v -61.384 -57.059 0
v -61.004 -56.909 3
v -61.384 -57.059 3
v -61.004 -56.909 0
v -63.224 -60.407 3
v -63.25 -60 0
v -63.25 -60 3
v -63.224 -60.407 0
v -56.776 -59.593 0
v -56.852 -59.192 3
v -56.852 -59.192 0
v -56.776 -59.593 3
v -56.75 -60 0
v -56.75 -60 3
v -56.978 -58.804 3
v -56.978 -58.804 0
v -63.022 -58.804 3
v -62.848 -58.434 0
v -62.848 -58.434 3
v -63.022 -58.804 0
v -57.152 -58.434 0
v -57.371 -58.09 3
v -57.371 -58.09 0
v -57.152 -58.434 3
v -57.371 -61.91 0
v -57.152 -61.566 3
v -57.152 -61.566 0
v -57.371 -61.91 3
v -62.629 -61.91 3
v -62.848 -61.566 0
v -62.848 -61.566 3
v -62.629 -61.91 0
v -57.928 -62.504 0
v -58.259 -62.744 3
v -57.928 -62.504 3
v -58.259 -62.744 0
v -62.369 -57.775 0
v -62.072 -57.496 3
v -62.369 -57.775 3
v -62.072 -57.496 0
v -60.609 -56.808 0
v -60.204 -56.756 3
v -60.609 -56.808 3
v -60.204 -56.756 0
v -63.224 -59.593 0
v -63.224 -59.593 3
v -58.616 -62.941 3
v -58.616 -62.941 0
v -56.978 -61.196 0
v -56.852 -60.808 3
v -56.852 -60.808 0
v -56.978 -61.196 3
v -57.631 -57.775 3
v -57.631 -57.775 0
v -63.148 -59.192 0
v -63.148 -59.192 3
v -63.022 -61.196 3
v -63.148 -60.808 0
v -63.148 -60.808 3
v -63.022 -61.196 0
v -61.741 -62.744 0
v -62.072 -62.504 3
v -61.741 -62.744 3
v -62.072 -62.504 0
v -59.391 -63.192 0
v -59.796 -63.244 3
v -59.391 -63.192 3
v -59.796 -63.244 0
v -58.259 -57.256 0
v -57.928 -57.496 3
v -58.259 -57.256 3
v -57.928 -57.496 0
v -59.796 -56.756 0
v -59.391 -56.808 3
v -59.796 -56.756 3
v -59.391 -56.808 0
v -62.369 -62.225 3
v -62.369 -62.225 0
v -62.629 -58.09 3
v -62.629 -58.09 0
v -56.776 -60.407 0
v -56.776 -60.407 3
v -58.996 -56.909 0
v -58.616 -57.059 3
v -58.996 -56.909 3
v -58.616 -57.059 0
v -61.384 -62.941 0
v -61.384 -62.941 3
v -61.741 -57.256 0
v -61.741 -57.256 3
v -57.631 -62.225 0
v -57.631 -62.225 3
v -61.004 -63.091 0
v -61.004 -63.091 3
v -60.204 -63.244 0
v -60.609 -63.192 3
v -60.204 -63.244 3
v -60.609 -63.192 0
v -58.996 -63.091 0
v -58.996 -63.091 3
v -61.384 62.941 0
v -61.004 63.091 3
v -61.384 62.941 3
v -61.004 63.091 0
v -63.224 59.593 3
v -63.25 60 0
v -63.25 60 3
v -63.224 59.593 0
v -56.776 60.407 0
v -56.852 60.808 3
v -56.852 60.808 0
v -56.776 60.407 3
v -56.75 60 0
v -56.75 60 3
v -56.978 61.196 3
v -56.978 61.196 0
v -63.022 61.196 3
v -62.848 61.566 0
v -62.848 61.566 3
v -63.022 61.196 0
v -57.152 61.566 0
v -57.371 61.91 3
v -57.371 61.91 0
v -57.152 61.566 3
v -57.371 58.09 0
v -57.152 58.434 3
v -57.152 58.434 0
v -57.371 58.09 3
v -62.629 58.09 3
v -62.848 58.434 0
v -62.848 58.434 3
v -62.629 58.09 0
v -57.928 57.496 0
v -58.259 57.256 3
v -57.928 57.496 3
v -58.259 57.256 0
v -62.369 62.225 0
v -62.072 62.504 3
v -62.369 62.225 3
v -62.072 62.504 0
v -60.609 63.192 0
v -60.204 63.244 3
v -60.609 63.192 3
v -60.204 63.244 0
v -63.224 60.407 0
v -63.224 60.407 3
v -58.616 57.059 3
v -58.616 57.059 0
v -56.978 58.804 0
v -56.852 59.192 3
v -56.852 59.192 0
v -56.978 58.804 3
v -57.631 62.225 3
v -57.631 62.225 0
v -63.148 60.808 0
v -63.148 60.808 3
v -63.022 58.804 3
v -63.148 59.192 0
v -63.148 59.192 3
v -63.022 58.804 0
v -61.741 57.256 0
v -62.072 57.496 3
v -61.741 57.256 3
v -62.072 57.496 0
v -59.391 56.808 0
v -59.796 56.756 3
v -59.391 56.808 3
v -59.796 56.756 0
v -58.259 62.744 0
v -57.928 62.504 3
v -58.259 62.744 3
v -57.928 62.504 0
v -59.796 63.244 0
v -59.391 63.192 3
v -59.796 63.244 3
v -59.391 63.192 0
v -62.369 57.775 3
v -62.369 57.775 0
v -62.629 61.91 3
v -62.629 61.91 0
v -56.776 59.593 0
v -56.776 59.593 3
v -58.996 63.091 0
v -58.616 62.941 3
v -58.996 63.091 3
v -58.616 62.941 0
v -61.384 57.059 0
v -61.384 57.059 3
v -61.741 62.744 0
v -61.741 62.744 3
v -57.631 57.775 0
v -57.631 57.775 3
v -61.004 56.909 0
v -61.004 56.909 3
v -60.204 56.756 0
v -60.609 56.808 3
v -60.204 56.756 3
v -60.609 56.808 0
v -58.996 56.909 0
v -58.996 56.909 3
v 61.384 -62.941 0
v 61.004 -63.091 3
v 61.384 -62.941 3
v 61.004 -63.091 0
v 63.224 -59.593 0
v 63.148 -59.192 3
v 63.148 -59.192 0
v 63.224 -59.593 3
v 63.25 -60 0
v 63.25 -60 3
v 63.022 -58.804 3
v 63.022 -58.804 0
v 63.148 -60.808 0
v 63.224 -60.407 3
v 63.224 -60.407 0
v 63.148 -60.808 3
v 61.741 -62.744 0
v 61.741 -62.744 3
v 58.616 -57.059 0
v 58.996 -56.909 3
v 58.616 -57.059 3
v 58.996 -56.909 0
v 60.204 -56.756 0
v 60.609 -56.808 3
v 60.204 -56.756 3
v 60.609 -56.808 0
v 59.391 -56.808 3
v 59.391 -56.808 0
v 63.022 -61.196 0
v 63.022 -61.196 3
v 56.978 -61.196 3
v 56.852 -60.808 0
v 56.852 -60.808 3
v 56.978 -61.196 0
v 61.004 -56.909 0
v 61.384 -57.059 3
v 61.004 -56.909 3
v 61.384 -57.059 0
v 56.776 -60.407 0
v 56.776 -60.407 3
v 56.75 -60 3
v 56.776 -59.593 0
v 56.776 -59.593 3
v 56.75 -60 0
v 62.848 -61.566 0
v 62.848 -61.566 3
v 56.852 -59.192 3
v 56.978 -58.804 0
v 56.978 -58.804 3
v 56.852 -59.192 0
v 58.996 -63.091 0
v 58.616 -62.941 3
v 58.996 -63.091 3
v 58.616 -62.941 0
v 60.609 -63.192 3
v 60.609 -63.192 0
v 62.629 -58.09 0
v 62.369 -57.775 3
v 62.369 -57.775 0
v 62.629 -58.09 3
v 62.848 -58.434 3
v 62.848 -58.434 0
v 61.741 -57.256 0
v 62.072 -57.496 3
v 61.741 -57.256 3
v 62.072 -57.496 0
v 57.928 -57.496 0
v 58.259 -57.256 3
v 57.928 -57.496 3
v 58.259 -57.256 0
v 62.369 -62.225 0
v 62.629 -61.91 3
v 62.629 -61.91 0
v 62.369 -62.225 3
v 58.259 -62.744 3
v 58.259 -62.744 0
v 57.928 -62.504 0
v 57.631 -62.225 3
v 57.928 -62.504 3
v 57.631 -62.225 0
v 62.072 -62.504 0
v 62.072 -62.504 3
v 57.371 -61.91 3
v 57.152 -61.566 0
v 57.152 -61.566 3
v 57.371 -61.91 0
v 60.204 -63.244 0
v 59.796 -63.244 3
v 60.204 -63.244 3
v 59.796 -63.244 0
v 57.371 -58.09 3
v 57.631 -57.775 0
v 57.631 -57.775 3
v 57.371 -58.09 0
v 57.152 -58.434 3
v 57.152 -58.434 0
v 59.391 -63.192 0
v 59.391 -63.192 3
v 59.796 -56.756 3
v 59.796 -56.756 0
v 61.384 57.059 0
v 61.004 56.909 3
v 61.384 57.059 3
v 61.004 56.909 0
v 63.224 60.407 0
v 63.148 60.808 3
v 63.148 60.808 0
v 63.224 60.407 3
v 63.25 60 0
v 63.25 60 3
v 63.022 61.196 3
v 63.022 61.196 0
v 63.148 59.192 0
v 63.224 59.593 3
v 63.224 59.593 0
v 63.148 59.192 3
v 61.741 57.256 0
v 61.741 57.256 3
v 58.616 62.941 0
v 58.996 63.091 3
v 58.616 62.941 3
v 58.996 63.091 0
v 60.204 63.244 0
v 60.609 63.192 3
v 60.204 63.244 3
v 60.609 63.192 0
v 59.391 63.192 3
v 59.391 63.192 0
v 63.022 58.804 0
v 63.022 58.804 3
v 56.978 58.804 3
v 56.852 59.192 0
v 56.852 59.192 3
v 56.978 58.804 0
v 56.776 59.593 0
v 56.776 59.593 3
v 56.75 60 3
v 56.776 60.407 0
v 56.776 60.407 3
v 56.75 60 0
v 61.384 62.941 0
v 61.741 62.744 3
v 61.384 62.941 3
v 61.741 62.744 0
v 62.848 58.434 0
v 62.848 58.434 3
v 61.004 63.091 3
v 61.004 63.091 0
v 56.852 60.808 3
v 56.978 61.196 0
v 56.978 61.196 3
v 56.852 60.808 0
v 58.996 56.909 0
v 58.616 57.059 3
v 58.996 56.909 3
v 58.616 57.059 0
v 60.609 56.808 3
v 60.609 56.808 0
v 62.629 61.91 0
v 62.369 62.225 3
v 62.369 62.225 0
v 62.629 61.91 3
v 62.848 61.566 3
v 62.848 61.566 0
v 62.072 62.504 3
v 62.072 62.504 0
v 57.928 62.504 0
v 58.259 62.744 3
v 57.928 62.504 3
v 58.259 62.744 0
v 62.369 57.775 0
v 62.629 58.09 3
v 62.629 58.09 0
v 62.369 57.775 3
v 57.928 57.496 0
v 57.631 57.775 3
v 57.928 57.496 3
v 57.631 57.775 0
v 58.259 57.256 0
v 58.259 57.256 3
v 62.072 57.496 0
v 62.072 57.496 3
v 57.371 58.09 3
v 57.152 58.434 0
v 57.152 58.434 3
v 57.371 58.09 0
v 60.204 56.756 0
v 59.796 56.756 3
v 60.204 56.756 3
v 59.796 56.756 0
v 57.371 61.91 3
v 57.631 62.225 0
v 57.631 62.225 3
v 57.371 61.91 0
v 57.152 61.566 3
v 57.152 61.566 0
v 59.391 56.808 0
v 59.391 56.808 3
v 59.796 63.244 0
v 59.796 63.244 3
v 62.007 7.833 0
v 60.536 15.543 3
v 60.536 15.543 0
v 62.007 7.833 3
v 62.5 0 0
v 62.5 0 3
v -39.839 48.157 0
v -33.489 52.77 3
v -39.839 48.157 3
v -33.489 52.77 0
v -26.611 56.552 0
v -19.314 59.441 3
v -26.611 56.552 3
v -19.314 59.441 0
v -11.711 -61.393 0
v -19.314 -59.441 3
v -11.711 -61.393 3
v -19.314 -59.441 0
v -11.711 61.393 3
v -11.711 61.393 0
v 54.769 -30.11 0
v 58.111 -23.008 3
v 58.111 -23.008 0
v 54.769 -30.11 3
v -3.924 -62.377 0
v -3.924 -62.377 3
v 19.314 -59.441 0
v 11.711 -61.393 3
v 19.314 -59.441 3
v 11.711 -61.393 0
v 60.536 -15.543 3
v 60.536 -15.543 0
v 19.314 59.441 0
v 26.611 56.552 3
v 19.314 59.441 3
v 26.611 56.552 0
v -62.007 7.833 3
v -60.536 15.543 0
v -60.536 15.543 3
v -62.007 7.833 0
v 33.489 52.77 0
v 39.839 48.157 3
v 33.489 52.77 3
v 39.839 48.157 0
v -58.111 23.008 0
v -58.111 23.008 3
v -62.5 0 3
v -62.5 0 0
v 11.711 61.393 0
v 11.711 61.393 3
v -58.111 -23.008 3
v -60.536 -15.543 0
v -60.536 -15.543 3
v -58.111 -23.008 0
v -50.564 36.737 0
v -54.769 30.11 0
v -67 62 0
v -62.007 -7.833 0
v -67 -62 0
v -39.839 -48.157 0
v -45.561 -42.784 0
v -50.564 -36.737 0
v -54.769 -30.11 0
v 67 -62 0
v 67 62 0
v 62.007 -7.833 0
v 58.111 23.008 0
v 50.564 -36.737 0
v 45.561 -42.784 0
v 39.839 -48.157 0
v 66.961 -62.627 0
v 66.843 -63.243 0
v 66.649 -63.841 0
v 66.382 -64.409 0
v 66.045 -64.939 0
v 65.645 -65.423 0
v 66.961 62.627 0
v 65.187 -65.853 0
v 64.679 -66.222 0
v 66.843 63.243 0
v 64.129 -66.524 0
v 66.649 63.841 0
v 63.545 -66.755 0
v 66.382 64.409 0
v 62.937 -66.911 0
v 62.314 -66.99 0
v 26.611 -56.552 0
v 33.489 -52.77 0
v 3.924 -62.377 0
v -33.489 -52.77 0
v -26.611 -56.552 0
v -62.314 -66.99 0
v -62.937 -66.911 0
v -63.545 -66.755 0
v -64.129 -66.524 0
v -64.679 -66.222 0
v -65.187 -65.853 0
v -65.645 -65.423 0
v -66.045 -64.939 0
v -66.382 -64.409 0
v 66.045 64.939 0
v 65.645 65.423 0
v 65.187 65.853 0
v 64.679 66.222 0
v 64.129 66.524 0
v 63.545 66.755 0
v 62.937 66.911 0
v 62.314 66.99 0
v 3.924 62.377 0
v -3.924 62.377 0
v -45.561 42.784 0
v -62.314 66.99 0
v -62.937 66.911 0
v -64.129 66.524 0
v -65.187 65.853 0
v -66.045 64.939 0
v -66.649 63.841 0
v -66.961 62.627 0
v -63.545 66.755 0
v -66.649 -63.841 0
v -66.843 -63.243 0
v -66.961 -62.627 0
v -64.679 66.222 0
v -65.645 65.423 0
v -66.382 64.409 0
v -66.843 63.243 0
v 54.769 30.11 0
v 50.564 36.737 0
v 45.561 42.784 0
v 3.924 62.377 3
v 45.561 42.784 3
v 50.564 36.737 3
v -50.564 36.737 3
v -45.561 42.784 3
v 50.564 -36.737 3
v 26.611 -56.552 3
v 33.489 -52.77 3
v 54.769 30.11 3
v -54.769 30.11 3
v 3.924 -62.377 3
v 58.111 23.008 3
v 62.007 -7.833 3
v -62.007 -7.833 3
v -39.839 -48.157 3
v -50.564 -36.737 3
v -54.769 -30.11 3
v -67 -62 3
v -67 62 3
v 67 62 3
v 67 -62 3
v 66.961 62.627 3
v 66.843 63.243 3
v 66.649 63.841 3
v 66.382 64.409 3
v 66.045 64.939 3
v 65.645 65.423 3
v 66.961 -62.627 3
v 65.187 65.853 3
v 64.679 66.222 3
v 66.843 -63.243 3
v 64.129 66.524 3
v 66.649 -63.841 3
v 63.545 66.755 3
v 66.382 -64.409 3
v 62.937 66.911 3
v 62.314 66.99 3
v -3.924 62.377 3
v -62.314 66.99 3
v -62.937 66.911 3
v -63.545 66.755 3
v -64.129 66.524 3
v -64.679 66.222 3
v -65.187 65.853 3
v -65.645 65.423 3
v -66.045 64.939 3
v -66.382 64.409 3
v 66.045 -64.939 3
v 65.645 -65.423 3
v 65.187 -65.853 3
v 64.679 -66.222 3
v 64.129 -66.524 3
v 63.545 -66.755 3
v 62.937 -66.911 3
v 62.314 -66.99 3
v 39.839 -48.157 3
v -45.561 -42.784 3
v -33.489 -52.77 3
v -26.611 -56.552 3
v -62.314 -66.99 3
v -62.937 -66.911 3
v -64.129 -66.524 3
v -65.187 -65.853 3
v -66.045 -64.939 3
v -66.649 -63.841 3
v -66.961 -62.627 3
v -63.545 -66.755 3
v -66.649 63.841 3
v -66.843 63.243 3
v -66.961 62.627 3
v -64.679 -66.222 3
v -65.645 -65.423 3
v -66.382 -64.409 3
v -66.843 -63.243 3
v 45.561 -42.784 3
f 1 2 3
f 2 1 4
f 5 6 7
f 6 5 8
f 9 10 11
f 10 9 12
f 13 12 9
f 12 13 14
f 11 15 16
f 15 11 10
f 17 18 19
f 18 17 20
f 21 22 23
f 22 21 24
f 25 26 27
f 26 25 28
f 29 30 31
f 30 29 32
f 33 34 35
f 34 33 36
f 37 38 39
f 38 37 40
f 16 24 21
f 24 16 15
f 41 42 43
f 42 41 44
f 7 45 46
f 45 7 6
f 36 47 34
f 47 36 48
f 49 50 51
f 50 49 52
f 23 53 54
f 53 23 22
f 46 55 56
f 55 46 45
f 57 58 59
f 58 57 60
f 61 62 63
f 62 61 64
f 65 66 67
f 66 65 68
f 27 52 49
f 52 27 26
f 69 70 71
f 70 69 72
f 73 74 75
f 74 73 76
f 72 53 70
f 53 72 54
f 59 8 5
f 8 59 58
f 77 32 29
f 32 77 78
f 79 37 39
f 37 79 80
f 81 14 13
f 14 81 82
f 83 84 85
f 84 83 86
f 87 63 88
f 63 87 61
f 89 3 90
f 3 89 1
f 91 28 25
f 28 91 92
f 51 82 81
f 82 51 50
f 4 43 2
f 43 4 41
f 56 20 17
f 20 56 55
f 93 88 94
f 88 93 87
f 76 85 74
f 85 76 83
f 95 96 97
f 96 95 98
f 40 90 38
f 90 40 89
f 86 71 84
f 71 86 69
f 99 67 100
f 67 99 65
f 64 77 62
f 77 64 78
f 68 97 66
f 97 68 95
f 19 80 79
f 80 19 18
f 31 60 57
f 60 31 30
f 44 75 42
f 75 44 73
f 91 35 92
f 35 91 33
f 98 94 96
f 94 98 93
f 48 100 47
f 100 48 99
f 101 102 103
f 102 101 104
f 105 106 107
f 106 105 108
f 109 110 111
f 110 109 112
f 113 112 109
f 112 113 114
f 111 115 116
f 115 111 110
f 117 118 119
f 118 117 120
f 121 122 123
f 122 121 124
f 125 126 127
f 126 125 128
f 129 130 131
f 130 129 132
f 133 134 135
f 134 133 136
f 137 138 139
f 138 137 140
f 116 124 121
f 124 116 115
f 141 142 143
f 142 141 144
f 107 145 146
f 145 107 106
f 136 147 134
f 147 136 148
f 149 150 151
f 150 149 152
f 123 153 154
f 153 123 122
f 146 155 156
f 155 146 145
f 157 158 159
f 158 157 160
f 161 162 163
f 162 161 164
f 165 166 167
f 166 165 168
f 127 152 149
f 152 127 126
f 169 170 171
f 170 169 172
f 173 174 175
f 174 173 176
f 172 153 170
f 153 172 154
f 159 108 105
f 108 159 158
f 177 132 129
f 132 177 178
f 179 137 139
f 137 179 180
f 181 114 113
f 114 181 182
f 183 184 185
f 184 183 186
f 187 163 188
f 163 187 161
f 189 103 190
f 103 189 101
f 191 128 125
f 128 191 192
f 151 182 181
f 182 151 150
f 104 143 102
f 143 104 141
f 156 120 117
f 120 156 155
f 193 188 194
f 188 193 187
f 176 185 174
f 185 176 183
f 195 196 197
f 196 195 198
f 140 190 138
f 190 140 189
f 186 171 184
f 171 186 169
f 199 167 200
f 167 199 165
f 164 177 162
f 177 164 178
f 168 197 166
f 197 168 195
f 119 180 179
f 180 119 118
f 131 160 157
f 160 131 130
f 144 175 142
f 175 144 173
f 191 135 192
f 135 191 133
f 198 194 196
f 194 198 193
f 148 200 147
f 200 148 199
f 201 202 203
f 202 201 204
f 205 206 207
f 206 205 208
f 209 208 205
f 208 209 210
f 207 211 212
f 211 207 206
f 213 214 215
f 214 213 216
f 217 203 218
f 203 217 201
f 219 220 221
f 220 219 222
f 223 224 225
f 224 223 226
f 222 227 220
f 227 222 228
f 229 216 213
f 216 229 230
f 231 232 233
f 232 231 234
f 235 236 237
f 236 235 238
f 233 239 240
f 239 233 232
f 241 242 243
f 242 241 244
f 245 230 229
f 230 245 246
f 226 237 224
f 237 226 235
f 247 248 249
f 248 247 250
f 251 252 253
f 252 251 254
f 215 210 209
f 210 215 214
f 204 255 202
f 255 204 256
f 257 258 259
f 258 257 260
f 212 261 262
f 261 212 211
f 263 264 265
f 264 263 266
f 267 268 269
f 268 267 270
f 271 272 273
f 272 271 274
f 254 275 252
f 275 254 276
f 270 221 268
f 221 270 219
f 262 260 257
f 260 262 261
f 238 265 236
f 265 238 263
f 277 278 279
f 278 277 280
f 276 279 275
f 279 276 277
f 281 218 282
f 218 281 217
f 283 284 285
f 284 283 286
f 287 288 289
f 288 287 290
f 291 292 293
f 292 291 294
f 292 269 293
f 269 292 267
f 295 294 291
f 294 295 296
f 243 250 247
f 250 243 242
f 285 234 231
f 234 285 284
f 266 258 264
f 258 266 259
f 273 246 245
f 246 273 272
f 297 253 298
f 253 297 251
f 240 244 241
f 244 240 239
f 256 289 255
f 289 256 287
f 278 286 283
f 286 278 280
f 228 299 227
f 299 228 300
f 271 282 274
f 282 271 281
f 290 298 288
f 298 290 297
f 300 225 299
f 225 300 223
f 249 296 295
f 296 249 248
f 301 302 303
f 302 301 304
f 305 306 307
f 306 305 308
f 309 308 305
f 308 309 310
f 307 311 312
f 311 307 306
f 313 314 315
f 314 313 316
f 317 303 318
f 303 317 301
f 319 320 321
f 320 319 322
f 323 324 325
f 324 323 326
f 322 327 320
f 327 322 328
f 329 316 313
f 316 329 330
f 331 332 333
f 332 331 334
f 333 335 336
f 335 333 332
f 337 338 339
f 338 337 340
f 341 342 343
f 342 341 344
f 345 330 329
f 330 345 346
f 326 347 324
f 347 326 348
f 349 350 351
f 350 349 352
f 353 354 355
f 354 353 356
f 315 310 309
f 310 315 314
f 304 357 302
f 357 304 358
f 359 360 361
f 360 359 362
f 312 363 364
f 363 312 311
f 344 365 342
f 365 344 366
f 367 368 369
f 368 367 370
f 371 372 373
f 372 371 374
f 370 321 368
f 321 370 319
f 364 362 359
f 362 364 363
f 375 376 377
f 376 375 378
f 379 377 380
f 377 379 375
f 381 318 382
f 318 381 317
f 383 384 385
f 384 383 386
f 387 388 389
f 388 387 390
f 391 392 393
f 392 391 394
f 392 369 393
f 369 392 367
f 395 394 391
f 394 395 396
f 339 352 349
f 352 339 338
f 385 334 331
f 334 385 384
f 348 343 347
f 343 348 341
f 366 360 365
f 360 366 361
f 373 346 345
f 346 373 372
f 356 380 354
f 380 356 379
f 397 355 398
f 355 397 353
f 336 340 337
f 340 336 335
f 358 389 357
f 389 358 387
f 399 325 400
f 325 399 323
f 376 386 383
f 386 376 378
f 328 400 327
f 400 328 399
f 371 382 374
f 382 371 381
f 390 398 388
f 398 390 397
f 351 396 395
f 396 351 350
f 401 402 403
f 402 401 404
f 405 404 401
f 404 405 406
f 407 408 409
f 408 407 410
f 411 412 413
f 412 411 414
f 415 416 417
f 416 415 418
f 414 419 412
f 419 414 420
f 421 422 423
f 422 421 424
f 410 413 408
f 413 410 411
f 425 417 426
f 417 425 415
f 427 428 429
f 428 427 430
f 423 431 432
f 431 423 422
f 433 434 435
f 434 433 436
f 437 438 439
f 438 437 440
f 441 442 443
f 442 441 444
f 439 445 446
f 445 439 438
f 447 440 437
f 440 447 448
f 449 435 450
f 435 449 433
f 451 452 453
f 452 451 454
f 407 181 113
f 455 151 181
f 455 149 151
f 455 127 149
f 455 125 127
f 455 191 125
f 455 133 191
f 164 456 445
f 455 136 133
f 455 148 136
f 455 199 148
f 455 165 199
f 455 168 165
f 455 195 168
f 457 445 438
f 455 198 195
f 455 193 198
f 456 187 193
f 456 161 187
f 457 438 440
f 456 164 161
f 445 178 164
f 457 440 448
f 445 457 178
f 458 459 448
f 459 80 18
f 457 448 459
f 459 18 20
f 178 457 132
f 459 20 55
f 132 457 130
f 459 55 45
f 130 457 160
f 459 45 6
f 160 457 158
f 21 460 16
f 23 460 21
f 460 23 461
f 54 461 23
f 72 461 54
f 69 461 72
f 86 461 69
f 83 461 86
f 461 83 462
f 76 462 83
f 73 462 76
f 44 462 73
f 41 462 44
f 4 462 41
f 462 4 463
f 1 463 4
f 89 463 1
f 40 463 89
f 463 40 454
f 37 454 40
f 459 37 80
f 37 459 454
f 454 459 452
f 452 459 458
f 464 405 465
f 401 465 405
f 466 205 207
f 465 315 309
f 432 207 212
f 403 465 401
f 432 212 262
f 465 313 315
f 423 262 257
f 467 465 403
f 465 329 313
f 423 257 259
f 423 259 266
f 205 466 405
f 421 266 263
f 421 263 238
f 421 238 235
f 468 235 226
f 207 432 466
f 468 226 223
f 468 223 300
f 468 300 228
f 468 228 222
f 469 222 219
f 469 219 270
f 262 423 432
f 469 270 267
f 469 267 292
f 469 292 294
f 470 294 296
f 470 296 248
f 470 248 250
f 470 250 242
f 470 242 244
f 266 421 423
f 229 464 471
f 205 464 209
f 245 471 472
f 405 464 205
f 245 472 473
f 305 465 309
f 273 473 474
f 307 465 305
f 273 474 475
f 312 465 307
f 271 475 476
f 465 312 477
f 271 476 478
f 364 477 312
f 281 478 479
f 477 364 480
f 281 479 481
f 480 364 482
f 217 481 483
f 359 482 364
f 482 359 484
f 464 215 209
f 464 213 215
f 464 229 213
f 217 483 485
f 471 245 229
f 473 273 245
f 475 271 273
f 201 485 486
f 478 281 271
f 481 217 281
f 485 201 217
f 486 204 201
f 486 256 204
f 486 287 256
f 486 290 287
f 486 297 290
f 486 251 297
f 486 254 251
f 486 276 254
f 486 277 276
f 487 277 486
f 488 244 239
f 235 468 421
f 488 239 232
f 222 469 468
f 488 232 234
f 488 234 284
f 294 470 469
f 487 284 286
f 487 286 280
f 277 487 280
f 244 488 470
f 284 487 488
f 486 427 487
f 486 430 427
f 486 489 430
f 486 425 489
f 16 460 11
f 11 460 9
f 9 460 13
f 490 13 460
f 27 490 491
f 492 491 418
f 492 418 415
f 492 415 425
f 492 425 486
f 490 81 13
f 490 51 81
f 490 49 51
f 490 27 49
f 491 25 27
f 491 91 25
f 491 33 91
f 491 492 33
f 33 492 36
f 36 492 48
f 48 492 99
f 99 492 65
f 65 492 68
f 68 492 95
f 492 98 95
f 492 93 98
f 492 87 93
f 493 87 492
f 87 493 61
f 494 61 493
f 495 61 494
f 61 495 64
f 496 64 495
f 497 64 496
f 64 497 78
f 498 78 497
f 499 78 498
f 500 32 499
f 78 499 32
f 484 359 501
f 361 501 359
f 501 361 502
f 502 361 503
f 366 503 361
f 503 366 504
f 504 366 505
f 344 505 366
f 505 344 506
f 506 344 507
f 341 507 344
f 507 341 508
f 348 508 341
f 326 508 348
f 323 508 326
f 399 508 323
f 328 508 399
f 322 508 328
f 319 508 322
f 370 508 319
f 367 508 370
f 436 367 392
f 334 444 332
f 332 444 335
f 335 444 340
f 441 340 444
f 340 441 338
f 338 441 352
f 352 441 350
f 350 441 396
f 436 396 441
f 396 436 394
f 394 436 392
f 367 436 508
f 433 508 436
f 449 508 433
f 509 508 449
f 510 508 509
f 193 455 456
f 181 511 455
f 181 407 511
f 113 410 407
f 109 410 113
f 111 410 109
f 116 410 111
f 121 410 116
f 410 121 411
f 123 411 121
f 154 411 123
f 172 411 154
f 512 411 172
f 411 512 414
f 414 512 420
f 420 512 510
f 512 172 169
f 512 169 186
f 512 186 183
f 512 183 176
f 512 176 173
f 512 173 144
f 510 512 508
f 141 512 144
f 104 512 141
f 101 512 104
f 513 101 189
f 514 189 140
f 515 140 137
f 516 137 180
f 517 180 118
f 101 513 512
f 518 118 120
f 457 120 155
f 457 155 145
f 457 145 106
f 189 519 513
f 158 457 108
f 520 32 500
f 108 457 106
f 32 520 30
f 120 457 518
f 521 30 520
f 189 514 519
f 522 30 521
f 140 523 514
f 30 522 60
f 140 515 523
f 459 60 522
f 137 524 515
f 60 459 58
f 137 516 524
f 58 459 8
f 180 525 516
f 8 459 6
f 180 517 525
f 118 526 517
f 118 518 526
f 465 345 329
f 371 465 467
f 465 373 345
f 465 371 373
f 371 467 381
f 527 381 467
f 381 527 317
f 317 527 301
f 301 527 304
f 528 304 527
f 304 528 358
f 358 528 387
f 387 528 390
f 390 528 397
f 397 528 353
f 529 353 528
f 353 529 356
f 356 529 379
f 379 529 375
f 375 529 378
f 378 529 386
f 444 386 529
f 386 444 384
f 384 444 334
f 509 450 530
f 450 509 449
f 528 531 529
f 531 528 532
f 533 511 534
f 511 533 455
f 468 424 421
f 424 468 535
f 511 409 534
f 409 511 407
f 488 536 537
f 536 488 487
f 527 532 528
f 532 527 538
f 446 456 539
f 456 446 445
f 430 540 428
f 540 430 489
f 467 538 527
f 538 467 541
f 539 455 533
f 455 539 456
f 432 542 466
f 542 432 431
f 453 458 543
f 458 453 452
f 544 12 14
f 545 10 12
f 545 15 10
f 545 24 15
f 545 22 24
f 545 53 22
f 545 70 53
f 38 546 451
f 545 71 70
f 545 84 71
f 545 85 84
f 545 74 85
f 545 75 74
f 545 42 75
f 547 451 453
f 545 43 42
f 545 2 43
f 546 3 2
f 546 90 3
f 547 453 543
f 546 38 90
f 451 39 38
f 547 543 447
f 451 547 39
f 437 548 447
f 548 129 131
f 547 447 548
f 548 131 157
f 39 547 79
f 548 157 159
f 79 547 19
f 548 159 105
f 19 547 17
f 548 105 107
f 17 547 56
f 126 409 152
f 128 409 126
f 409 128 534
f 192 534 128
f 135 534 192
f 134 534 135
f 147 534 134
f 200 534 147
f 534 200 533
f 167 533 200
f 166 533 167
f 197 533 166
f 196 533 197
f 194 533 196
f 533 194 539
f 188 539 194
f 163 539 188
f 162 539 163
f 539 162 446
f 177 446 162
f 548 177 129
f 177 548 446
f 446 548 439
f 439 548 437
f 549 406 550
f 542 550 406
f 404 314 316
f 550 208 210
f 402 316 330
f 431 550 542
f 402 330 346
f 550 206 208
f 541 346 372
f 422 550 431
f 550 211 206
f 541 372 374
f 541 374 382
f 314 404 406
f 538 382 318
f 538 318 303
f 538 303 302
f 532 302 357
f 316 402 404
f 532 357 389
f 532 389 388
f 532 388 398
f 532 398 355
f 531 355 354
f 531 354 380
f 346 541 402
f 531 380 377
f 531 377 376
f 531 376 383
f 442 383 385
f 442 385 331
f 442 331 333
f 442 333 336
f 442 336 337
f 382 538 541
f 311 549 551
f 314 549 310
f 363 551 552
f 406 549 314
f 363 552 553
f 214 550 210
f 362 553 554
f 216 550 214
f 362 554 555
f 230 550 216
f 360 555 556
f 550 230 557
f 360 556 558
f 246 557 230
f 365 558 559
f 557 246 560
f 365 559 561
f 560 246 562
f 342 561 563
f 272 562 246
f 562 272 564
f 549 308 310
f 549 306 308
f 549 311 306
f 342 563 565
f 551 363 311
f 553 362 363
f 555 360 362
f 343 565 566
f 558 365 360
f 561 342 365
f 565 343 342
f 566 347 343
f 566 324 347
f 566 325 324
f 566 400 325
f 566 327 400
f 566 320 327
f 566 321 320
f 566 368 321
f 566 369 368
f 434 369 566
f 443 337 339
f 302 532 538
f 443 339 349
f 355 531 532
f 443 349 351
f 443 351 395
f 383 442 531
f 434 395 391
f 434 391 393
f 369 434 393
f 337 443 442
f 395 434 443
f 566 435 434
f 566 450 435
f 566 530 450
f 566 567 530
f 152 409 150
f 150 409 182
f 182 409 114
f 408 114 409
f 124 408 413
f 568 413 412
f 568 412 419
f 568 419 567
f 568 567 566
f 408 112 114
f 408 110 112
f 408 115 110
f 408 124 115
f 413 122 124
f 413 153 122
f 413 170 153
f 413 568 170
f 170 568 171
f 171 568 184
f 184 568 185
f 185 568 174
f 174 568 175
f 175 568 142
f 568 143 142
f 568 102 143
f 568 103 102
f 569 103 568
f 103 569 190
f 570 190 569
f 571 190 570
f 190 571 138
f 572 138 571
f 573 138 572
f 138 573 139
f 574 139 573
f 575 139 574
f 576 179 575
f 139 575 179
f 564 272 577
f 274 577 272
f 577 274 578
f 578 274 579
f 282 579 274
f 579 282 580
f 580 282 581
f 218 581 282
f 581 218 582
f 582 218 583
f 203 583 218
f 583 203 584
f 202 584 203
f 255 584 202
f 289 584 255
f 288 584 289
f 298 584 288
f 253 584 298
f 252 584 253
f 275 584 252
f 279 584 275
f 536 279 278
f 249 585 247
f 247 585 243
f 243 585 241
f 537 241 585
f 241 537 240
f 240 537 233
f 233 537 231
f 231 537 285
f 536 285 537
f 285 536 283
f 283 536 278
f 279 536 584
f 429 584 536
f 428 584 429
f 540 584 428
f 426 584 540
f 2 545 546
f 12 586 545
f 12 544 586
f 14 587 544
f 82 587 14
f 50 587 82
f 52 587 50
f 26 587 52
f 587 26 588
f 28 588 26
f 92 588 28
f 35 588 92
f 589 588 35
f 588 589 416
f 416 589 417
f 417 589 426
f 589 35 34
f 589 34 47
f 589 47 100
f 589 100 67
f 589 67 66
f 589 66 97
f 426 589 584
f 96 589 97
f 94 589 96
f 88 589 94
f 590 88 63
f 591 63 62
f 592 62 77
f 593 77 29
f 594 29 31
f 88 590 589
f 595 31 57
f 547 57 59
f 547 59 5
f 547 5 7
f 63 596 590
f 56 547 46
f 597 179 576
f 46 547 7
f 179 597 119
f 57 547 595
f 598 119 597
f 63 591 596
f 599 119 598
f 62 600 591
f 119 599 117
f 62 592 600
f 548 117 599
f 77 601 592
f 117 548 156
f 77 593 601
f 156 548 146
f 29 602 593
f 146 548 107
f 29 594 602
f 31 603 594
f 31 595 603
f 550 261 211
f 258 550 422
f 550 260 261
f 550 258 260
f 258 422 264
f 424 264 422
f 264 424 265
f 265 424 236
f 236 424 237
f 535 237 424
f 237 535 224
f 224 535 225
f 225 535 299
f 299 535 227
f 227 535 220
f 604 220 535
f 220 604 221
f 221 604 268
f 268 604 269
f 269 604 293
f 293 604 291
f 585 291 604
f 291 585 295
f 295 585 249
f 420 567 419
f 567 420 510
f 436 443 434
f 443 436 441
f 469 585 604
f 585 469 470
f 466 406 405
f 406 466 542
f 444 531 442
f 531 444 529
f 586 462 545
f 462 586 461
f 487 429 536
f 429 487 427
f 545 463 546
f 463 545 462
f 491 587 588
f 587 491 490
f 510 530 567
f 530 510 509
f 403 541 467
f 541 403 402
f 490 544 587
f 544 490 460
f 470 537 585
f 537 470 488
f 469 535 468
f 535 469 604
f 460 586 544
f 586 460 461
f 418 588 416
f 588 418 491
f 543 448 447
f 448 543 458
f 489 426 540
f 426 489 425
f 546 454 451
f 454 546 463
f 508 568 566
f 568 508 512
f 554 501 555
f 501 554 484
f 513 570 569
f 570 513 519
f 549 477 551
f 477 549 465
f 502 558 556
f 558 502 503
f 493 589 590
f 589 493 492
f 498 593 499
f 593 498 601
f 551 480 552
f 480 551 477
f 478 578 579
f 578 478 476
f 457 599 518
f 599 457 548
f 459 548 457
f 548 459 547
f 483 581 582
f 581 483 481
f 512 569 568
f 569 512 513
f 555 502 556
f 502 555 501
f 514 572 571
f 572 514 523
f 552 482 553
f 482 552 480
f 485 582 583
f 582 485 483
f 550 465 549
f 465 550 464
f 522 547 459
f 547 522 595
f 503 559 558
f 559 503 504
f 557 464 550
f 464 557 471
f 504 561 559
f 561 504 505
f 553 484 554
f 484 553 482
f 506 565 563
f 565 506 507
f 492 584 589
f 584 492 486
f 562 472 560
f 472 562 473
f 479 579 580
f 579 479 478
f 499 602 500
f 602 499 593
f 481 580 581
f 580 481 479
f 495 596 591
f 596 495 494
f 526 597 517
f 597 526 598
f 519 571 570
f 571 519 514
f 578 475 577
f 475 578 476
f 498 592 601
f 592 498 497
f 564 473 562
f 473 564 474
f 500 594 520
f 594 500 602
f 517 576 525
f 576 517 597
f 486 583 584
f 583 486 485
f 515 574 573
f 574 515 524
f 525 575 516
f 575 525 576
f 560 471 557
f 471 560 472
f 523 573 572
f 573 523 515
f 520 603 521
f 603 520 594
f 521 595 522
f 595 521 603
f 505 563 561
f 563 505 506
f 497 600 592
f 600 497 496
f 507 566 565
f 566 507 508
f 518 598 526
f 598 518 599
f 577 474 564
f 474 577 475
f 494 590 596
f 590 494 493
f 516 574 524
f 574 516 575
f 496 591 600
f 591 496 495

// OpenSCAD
$fn = 50;

difference() {
	union() {
		hull() {
			translate(v = [-62.0, 62.0, 0]) {
				cylinder(h = 3, r = 5);
			}
			translate(v = [62.0, 62.0, 0]) {
				cylinder(h = 3, r = 5);
			}
			translate(v = [-62.0, -62.0, 0]) {
				cylinder(h = 3, r = 5);
			}
			translate(v = [62.0, -62.0, 0]) {
				cylinder(h = 3, r = 5);
			}
		}
	}
	union() {
		translate(v = [-60.0, -60.0, -100.0]) {
			cylinder(h = 200, r = 3.25);
		}
		translate(v = [-60.0, 60.0, -100.0]) {
			cylinder(h = 200, r = 3.25);
		}
		translate(v = [60.0, -60.0, -100.0]) {
			cylinder(h = 200, r = 3.25);
		}
		translate(v = [60.0, 60.0, -100.0]) {
			cylinder(h = 200, r = 3.25);
		}
		translate(v = [-60.0, -60.0, -100.0]) {
			cylinder(h = 200, r = 1.8);
		}
		translate(v = [-60.0, 60.0, -100.0]) {
			cylinder(h = 200, r = 1.8);
		}
		translate(v = [60.0, -60.0, -100.0]) {
			cylinder(h = 200, r = 1.8);
		}
		translate(v = [60.0, 60.0, -100.0]) {
			cylinder(h = 200, r = 1.8);
		}
		cylinder(h = 3, r = 62.5);
	}
}
